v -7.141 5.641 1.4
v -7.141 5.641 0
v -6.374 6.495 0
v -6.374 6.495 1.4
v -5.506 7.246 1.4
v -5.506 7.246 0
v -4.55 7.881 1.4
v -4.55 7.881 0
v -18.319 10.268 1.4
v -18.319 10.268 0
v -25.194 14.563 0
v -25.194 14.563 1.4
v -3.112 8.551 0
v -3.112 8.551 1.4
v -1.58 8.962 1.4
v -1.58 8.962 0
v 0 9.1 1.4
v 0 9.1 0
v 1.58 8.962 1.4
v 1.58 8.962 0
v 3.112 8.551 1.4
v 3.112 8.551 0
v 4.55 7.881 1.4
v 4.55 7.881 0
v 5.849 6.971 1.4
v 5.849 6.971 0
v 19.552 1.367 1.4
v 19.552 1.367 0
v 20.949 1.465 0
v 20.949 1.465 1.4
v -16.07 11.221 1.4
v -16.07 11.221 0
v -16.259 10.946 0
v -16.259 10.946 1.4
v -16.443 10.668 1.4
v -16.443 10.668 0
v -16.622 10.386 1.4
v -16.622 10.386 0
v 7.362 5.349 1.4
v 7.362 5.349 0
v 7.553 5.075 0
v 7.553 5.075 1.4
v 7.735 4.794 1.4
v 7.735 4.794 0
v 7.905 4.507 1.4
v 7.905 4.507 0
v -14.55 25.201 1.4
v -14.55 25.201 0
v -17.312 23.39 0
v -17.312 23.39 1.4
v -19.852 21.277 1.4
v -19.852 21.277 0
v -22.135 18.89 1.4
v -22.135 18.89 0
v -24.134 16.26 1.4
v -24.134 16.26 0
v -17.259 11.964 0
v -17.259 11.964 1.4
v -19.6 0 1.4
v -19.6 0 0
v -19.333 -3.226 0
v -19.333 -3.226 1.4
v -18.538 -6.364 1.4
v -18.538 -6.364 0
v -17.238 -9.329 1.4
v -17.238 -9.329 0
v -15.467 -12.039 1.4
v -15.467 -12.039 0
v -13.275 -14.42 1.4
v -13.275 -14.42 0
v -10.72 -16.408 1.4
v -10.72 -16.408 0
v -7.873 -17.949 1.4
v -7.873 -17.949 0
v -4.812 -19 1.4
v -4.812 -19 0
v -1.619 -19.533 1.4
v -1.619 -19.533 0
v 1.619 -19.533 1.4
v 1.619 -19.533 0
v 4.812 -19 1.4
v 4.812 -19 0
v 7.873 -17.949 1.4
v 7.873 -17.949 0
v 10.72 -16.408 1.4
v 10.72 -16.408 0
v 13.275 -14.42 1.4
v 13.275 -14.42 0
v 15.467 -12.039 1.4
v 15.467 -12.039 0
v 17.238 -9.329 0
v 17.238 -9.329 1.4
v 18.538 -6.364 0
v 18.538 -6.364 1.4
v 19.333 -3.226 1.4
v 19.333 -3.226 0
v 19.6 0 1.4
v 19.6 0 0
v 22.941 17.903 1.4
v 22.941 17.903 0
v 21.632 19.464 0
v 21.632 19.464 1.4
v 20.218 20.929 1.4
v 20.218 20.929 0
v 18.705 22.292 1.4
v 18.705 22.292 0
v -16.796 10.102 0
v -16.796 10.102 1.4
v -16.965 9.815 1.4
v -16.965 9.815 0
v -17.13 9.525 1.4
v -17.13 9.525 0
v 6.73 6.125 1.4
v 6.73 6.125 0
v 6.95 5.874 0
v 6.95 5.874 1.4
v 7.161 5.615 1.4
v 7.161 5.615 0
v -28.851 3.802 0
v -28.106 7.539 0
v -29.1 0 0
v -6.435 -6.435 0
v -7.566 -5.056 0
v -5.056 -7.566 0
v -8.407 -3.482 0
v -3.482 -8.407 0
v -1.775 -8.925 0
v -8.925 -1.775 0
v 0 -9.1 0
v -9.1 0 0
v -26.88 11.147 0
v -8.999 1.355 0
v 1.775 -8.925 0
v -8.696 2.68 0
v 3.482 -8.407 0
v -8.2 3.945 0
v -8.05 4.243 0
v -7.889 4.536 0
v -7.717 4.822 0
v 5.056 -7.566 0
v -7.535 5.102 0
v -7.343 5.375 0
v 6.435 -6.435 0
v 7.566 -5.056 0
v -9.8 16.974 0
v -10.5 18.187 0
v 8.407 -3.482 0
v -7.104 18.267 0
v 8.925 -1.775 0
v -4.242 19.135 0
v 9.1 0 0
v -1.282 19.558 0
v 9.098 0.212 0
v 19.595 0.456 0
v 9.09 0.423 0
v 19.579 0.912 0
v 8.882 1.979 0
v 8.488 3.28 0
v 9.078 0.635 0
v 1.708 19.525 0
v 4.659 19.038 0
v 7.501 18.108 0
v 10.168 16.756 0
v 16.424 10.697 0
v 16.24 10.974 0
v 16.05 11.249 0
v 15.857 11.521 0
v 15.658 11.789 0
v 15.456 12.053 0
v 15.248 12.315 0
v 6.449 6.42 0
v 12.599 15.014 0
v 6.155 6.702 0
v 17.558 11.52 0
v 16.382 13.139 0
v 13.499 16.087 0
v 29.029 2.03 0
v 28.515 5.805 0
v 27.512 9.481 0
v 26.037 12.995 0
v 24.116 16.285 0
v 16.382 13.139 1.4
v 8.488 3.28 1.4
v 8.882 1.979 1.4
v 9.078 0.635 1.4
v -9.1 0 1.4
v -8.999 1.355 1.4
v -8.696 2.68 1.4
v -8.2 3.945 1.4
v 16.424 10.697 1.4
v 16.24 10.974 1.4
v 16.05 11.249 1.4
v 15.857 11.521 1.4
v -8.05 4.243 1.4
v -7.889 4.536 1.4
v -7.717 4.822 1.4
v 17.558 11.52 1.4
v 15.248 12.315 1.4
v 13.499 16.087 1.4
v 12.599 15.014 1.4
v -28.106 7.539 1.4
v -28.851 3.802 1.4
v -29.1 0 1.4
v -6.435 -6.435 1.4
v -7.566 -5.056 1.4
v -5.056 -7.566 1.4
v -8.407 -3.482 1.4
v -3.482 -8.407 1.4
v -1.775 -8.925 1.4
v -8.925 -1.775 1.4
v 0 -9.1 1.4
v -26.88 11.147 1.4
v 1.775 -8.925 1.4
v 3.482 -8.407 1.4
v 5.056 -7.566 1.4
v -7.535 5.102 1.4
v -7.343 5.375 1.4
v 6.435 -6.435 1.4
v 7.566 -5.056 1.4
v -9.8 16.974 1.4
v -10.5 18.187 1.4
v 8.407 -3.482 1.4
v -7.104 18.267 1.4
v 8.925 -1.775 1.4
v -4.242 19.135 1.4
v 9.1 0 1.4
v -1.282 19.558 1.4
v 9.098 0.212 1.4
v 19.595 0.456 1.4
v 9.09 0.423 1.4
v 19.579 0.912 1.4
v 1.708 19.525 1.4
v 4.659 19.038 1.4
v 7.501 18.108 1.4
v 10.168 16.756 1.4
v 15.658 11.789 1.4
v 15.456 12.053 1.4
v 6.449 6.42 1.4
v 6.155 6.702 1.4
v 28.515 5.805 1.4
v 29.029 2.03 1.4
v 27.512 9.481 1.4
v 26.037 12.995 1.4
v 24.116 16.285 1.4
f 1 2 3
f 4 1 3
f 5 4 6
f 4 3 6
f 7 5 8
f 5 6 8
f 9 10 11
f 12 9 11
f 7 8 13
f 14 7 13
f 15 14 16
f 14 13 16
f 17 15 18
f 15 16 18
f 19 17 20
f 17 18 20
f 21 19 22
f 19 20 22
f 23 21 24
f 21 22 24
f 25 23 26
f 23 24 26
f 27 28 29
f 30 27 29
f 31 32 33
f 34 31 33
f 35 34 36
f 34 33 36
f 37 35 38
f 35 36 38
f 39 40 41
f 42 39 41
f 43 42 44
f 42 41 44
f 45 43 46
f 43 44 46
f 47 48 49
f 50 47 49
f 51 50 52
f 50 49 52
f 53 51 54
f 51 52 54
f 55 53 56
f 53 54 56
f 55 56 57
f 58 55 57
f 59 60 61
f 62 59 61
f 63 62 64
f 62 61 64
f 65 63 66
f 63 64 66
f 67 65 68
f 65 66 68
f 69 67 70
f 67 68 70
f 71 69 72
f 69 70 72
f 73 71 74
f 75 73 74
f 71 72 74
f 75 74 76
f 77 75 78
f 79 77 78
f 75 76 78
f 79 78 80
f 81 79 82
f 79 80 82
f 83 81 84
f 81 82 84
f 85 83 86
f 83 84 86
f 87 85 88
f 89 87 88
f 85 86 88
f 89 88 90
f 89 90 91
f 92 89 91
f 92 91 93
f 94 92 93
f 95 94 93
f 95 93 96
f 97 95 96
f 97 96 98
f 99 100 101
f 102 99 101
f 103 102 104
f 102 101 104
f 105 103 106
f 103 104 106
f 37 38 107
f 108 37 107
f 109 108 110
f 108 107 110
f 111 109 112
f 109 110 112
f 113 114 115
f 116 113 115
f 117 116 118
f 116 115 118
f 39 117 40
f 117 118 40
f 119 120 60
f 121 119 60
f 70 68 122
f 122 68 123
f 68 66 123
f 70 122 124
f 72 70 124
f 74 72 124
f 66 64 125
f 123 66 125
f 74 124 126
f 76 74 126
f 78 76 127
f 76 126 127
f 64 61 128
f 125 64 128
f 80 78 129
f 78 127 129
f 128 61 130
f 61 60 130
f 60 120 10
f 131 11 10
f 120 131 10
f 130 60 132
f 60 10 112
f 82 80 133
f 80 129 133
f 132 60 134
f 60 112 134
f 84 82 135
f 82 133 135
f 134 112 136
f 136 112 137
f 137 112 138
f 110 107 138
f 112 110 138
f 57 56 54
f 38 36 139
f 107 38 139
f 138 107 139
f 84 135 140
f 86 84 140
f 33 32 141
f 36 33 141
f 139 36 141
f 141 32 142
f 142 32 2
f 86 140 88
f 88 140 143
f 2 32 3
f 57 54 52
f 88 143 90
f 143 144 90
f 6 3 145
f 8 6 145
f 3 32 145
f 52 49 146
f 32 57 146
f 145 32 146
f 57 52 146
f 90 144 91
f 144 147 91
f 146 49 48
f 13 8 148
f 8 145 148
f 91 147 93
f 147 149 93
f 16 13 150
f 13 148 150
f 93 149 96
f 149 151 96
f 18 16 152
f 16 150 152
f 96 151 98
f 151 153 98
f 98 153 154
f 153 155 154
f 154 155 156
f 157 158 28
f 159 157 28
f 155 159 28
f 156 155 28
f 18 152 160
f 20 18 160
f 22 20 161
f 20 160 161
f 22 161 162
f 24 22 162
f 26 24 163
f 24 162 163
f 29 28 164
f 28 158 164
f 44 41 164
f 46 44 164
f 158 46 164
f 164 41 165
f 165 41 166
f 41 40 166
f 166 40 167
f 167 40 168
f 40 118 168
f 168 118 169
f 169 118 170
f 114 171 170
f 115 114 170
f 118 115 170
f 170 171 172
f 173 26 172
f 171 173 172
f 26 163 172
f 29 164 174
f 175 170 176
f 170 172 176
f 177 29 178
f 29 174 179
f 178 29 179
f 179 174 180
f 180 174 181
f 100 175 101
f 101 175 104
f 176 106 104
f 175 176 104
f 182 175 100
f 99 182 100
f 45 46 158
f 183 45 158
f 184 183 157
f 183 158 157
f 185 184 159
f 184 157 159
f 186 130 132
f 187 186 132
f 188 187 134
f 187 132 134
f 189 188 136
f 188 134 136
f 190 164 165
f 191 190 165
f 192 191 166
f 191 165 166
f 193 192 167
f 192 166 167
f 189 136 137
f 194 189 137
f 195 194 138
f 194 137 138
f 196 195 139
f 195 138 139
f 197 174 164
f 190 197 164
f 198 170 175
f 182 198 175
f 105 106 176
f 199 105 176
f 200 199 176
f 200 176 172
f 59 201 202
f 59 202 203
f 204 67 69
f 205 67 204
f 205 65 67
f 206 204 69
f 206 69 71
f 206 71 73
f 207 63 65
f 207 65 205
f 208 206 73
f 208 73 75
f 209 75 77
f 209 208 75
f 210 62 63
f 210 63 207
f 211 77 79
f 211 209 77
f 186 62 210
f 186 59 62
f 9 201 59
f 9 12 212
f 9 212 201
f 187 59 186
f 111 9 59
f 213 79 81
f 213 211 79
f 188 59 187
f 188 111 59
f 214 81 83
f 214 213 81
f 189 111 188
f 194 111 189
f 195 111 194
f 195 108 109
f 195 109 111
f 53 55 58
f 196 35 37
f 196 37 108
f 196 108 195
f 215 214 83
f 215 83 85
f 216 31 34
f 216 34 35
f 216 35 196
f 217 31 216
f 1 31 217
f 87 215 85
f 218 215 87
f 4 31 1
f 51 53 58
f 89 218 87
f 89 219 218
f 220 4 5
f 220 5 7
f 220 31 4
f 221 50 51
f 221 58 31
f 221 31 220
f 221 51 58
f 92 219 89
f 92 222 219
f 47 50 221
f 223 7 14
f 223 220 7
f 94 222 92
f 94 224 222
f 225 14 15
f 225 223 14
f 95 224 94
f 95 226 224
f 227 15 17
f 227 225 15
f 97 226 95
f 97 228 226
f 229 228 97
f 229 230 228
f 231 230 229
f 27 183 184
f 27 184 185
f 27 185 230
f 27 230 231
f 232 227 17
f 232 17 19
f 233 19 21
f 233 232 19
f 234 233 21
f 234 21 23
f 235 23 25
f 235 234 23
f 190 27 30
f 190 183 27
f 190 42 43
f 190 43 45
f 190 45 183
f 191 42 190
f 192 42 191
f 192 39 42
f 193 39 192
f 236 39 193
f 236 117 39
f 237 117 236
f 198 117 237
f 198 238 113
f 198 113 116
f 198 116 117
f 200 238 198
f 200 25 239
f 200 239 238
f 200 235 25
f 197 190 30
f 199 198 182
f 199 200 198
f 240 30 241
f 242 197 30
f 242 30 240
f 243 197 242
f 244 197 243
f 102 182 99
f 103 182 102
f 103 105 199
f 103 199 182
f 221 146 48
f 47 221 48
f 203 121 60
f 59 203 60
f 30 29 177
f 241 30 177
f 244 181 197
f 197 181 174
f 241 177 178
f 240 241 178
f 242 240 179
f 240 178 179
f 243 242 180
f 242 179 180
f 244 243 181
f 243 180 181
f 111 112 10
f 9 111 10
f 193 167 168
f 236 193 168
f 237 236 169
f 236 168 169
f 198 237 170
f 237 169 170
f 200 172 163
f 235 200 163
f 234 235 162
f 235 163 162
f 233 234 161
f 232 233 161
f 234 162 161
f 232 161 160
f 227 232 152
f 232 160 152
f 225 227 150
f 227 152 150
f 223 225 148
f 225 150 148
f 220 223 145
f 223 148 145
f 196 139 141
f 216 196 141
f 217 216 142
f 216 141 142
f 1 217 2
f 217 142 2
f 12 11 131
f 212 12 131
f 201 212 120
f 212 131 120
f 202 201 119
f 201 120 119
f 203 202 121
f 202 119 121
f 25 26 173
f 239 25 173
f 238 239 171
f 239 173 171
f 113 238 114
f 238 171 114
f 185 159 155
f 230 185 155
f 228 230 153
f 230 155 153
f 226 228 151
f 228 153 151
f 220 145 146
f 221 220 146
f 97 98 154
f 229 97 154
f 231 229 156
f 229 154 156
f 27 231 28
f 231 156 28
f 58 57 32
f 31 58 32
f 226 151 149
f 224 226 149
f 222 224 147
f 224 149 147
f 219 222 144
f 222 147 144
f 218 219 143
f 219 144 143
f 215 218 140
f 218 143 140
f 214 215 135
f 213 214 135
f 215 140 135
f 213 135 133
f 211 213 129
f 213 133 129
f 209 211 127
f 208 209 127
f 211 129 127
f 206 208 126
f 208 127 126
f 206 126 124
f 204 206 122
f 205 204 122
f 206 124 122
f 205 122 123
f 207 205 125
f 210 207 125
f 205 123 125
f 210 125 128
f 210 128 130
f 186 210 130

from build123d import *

# Parameters (mm, degrees)
F1_DEPTH = 1.4


# Not quite as in the source:
# - a feature names something its author has since deleted; it is built from what else it names


with BuildPart() as f1:
    # F0 (on Top) → F1 (new body)
    with BuildSketch(Plane.XY):
        with BuildLine():
            Line((9.1, 0), (19.6, 0))
            ThreePointArc((19.6, 0), (19.5880602096, 0.6840301354), (19.5522553851, 1.3672268854))
            Line((19.5522553851, 1.3672268854), (9.0778328574, 0.6347839111))
            ThreePointArc((9.0778328574, 0.6347839111), (9.0944565259, 0.31758542), (9.1, 0))
        make_face()
        with BuildLine():
            ThreePointArc((-19.6, 0), (0, -19.6), (19.6, 0))
            Line((19.6, 0), (9.1, 0))
            ThreePointArc((9.1, 0), (0, -9.1), (-9.1, 0))
            Line((-9.1, 0), (-19.6, 0))
        make_face()
        with BuildLine():
            Line((9.0778328574, 0.6347839111), (19.5522553851, 1.3672268854))
            ThreePointArc((19.5522553851, 1.3672268854), (18.5830433274, 6.2314124156), (16.4238667052, 10.6965696581))
            Line((16.4238667052, 10.6965696581), (7.9052534042, 4.5074348153))
            ThreePointArc((7.9052534042, 4.5074348153), (8.7095155433, 2.6371080753), (9.0778328574, 0.6347839111))
        make_face()
        with BuildLine():
            ThreePointArc((16.4238667052, 10.6965696581), (18.5830433274, 6.2314124156), (19.5522553851, 1.3672268854))
            Line((19.5522553851, 1.3672268854), (20.9488450555, 1.4648859486))
            ThreePointArc((20.9488450555, 1.4648859486), (19.8990062518, 6.7104061122), (17.5578688927, 11.5204704742))
            Line((17.5578688927, 11.5204704742), (16.4238667052, 10.6965696581))
        make_face()
        with BuildLine():
            Line((-21, 0), (-19.6, 0))
            ThreePointArc((-19.6, 0), (-18.9724573243, 4.9199454342), (-17.1300139719, 9.5248423254))
            Line((-17.1300139719, 9.5248423254), (-18.3187262027, 10.2676321667))
            ThreePointArc((-18.3187262027, 10.2676321667), (-20.3186275405, 5.3059753931), (-21, 0))
        make_face()
        with BuildLine():
            ThreePointArc((-17.1300139719, 9.5248423254), (-18.9724573243, 4.9199454342), (-19.6, 0))
            Line((-19.6, 0), (-9.1, 0))
            ThreePointArc((-9.1, 0), (-8.8722549614, 2.0231391203), (-8.2004193626, 3.9450123291))
            Line((-8.2004193626, 3.9450123291), (-17.1300139719, 9.5248423254))
        make_face()
        with BuildLine():
            Line((7.9052534042, 4.5074348153), (16.4238667052, 10.6965696581))
            ThreePointArc((16.4238667052, 10.6965696581), (16.1455577033, 11.1121989925), (15.8567330897, 11.5205909449))
            Line((15.8567330897, 11.5205909449), (7.3620546488, 5.3488457959))
            ThreePointArc((7.3620546488, 5.3488457959), (7.6452381851, 4.9356188157), (7.9052534042, 4.5074348153))
        make_face()
        with BuildLine():
            ThreePointArc((17.5578688927, 11.5204704742), (19.8990062518, 6.7104061122), (20.9488450555, 1.4648859486))
            Line((20.9488450555, 1.4648859486), (29.0291138626, 2.029913386))
            ThreePointArc((29.0291138626, 2.029913386), (27.512052622, 9.481400768), (24.1162750467, 16.285431461))
            Line((24.1162750467, 16.285431461), (17.5578688927, 11.5204704742))
        make_face()
        with BuildLine():
            ThreePointArc((-16.6217426847, 10.386417579), (-16.8813757535, 9.9588730623), (-17.1300139719, 9.5248423254))
            Line((-17.1300139719, 9.5248423254), (-8.2004193626, 3.9450123291))
            ThreePointArc((-8.2004193626, 3.9450123291), (-7.9709061334, 4.3902910396), (-7.717237675, 4.8222653045))
            Line((-7.717237675, 4.8222653045), (-16.6217426847, 10.386417579))
        make_face()
        with BuildLine():
            Line((-29.1, 0), (-21, 0))
            ThreePointArc((-21, 0), (-20.3186275405, 5.3059753931), (-18.3187262027, 10.2676321667))
            Line((-18.3187262027, 10.2676321667), (-25.1935432849, 14.5634946614))
            ThreePointArc((-25.1935432849, 14.5634946614), (-28.1064237283, 7.5391607759), (-29.1, 0))
        make_face()
        with BuildLine():
            Line((7.3620546488, 5.3488457959), (15.8567330897, 11.5205909449))
            ThreePointArc((15.8567330897, 11.5205909449), (15.5575809762, 11.9214795294), (15.2482962006, 12.3146036469))
            Line((15.2482962006, 12.3146036469), (6.7296828997, 6.1254688041))
            ThreePointArc((6.7296828997, 6.1254688041), (7.0565609618, 5.7458635027), (7.3620546488, 5.3488457959))
        make_face()
        with BuildLine():
            ThreePointArc((-16.0701754434, 11.2209385177), (-16.3512838646, 10.8071974155), (-16.6217426847, 10.386417579))
            Line((-16.6217426847, 10.386417579), (-7.717237675, 4.8222653045))
            ThreePointArc((-7.717237675, 4.8222653045), (-7.4401827106, 5.2396260586), (-7.1405808342, 5.6411085215))
            Line((-7.1405808342, 5.6411085215), (-16.0701754434, 11.2209385177))
        make_face()
        with BuildLine():
            Line((6.7296828997, 6.1254688041), (15.2482962006, 12.3146036469))
            ThreePointArc((15.2482962006, 12.3146036469), (13.9887542441, 13.7286108073), (12.5986371499, 15.0144710851))
            Line((12.5986371499, 15.0144710851), (5.8493672481, 6.9710044324))
            ThreePointArc((5.8493672481, 6.9710044324), (6.3037178141, 6.5630131586), (6.7296828997, 6.1254688041))
        make_face()
        with BuildLine():
            ThreePointArc((12.5986371499, 15.0144710851), (13.9887542441, 13.7286108073), (15.2482962006, 12.3146036469))
            Line((15.2482962006, 12.3146036469), (16.3822983881, 13.1385044629))
            ThreePointArc((16.3822983881, 13.1385044629), (15.0129754185, 14.6836837709), (13.4985398034, 16.0869333055))
            Line((13.4985398034, 16.0869333055), (12.5986371499, 15.0144710851))
        make_face()
        with BuildLine():
            Line((-17.2588876742, 11.963728359), (-16.0701754434, 11.2209385177))
            ThreePointArc((-16.0701754434, 11.2209385177), (-13.2510831681, 14.4419110533), (-9.8, 16.9740979142))
            Line((-9.8, 16.9740979142), (-10.5, 18.1865334795))
            ThreePointArc((-10.5, 18.1865334795), (-14.2239160262, 15.4492787172), (-17.2588876742, 11.963728359))
        make_face()
        with BuildLine():
            ThreePointArc((-9.8, 16.9740979142), (-13.2510831681, 14.4419110533), (-16.0701754434, 11.2209385177))
            Line((-16.0701754434, 11.2209385177), (-7.1405808342, 5.6411085215))
            ThreePointArc((-7.1405808342, 5.6411085215), (-5.9515972184, 6.8839298769), (-4.55, 7.8808311744))
            Line((-4.55, 7.8808311744), (-9.8, 16.9740979142))
        make_face()
        with BuildLine():
            Line((5.8493672481, 6.9710044324), (12.5986371499, 15.0144710851))
            ThreePointArc((12.5986371499, 15.0144710851), (1.7082525579, 19.5254160826), (-9.8, 16.9740979142))
            Line((-9.8, 16.9740979142), (-4.55, 7.8808311744))
            ThreePointArc((-4.55, 7.8808311744), (0.793117259, 9.0653717526), (5.8493672481, 6.9710044324))
        make_face()
        with BuildLine():
            ThreePointArc((13.4985398034, 16.0869333055), (15.0129754185, 14.6836837709), (16.3822983881, 13.1385044629))
            Line((16.3822983881, 13.1385044629), (22.9407045421, 17.9034654498))
            ThreePointArc((22.9407045421, 17.9034654498), (20.9382004615, 20.2089525071), (18.7051194419, 22.2918932948))
            Line((18.7051194419, 22.2918932948), (13.4985398034, 16.0869333055))
        make_face()
        with BuildLine():
            Line((-24.1337047564, 16.2595908537), (-17.2588876742, 11.963728359))
            ThreePointArc((-17.2588876742, 11.963728359), (-14.2239160262, 15.4492787172), (-10.5, 18.1865334795))
            Line((-10.5, 18.1865334795), (-14.55, 25.2013392501))
            ThreePointArc((-14.55, 25.2013392501), (-19.8518505313, 21.2770775832), (-24.1337047564, 16.2595908537))
        make_face()
    extrude(amount=F1_DEPTH)


solid = f1.part
